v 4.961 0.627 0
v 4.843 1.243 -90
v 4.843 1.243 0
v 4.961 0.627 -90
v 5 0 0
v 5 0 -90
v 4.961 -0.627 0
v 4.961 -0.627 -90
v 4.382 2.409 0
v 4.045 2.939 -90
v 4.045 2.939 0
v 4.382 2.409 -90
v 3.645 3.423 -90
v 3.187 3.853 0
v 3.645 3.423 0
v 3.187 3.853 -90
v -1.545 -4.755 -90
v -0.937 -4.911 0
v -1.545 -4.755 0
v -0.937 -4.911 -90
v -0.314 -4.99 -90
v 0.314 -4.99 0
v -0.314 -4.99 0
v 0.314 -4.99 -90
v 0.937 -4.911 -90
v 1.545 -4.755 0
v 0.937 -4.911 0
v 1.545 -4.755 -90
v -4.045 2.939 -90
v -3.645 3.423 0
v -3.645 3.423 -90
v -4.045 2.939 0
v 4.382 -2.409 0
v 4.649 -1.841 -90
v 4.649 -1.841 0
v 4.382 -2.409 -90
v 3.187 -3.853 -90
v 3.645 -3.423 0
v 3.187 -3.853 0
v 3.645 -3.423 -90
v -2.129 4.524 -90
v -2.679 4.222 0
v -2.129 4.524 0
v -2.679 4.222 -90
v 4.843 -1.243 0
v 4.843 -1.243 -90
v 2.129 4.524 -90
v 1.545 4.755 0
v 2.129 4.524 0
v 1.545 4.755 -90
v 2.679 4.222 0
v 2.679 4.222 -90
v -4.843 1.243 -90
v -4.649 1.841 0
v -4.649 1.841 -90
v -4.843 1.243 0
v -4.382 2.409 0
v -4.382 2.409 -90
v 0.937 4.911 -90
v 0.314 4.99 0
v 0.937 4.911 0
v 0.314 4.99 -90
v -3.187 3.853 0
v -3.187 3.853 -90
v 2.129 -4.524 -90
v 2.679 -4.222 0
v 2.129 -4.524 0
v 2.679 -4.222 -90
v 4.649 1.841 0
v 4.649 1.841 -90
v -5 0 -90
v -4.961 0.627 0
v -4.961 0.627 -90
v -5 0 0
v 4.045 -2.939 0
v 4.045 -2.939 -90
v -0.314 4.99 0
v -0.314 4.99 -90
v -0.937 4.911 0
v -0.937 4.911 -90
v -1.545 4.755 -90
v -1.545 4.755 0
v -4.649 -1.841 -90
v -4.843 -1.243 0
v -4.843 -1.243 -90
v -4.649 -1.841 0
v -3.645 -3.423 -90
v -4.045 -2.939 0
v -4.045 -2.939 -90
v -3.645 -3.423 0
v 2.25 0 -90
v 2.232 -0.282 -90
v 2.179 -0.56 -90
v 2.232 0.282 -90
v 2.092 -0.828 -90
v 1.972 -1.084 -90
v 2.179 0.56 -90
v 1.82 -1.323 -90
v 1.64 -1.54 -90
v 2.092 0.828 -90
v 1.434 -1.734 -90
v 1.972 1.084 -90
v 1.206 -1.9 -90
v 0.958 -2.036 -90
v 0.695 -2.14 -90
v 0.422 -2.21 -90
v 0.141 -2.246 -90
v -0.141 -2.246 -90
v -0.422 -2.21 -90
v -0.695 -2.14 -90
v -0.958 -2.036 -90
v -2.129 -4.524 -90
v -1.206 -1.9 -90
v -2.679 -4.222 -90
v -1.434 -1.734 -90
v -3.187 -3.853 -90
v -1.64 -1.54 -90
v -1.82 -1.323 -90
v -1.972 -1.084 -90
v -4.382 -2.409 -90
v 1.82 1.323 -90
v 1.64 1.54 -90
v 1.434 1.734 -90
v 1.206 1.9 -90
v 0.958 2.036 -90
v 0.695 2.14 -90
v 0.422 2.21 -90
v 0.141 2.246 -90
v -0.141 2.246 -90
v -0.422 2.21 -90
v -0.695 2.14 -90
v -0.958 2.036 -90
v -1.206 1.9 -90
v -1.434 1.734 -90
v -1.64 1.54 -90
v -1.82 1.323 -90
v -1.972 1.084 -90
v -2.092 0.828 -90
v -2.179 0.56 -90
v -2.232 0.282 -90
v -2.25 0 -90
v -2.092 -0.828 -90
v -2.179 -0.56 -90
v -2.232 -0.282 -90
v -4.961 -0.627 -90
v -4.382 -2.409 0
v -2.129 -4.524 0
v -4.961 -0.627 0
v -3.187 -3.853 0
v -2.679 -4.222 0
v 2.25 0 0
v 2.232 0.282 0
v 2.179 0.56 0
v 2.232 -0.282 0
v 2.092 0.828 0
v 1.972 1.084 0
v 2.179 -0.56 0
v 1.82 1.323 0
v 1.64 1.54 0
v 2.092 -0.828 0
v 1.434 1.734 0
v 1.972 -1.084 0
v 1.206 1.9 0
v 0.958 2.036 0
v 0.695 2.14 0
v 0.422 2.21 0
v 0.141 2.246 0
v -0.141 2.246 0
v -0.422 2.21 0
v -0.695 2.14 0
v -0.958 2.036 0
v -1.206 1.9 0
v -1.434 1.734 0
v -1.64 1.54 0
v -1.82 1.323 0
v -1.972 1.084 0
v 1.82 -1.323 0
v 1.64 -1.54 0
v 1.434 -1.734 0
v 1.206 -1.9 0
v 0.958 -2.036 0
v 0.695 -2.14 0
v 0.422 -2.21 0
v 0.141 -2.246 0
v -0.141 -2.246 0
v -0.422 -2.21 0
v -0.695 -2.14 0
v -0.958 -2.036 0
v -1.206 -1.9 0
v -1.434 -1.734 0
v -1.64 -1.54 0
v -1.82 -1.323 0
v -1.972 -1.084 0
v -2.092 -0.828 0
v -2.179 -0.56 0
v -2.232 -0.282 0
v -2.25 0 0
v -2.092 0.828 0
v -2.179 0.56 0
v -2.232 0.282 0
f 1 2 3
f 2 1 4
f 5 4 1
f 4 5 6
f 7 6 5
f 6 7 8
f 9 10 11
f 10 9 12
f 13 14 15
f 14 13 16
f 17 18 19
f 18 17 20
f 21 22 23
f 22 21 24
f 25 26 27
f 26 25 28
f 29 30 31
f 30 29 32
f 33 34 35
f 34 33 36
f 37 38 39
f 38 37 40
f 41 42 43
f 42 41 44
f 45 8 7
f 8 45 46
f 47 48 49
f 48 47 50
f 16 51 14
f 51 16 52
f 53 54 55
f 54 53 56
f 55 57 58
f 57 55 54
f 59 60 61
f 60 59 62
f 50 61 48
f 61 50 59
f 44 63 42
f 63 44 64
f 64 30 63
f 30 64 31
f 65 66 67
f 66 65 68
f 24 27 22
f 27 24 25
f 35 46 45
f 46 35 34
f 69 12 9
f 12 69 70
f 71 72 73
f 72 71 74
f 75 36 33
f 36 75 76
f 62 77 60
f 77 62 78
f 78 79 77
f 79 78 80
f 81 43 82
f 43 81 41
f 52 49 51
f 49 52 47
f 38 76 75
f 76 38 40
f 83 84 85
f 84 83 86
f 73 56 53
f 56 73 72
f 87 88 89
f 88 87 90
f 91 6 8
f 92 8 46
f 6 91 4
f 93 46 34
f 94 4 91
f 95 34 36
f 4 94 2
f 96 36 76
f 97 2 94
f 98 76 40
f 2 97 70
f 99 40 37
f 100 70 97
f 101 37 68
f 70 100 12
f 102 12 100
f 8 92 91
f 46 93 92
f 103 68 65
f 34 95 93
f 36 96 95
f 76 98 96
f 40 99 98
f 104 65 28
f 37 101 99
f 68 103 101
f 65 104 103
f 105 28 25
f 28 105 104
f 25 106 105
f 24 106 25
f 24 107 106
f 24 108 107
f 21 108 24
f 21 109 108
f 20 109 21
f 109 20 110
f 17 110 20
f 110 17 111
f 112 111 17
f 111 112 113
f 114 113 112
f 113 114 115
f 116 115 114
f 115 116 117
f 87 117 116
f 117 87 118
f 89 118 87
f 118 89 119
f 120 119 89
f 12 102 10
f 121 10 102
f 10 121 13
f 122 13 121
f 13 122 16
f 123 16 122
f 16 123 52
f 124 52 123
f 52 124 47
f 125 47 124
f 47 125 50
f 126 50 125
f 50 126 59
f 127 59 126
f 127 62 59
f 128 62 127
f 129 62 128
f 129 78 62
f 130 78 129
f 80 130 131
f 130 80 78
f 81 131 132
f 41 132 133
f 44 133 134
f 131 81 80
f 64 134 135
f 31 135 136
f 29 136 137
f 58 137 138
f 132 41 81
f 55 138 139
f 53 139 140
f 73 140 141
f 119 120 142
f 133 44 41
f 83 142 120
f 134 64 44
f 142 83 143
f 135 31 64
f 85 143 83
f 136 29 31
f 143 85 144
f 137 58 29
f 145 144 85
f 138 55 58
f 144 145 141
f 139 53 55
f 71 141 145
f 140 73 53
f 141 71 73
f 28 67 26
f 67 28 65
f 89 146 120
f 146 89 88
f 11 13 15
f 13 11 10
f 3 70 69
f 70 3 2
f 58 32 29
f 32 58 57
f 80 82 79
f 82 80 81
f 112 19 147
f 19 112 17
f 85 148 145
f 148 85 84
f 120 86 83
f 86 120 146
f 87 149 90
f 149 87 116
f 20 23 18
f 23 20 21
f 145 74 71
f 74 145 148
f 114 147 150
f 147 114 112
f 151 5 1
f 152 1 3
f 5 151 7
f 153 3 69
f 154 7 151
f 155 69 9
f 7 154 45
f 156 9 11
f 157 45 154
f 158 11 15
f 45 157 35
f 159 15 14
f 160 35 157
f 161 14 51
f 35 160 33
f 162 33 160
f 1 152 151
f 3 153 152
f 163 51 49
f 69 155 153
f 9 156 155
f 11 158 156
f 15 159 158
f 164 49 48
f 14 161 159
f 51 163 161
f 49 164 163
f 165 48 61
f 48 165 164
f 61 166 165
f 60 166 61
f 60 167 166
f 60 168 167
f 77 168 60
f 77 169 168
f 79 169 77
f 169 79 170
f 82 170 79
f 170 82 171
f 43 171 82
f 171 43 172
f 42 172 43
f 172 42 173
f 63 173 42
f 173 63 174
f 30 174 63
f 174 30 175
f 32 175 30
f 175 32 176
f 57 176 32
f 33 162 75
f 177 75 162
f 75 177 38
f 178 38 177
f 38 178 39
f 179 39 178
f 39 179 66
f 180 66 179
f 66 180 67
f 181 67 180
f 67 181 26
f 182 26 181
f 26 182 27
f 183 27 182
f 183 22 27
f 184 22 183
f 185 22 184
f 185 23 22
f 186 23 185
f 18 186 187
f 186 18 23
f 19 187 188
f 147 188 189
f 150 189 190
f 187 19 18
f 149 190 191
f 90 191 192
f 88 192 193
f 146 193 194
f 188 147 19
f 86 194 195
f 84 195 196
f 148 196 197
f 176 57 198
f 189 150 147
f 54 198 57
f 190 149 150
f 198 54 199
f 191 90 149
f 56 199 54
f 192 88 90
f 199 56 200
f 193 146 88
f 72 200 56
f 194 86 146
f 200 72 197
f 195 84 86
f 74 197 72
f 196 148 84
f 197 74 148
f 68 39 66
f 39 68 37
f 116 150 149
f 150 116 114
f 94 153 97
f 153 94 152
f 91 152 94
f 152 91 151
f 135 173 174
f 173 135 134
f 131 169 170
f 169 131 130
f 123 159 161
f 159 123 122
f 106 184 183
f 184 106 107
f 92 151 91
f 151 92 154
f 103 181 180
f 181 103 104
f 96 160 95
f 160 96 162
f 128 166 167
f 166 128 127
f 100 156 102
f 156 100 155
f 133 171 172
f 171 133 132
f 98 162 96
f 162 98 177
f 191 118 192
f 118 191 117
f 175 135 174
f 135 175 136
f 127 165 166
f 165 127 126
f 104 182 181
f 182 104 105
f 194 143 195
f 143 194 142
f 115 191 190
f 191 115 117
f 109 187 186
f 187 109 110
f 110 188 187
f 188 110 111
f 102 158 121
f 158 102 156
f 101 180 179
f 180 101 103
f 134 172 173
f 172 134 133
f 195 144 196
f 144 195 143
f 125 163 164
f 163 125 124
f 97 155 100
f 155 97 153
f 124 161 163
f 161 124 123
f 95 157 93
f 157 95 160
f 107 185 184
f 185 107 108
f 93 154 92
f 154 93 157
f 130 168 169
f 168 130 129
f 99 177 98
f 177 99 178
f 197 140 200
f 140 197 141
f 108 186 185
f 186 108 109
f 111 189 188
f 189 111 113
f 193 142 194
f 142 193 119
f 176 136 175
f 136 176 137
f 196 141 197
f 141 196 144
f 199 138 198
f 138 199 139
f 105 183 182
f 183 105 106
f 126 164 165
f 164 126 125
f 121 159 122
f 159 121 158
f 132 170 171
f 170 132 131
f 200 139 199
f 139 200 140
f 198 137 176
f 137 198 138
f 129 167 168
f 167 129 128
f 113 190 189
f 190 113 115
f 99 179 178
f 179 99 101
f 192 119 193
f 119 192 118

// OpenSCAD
$fn = 50;


difference() {
	union() {
		translate(v = [0, 0, -90.0000000000]) {
			cylinder(h = 90, r = 5.0000000000);
		}
		cylinder(h = 0, r = 8.0000000000);
	}
	union() {
		#translate(v = [0, 0, -90]) {
			cylinder(h = 90, r = 2.2500000000);
		}
	}
}
